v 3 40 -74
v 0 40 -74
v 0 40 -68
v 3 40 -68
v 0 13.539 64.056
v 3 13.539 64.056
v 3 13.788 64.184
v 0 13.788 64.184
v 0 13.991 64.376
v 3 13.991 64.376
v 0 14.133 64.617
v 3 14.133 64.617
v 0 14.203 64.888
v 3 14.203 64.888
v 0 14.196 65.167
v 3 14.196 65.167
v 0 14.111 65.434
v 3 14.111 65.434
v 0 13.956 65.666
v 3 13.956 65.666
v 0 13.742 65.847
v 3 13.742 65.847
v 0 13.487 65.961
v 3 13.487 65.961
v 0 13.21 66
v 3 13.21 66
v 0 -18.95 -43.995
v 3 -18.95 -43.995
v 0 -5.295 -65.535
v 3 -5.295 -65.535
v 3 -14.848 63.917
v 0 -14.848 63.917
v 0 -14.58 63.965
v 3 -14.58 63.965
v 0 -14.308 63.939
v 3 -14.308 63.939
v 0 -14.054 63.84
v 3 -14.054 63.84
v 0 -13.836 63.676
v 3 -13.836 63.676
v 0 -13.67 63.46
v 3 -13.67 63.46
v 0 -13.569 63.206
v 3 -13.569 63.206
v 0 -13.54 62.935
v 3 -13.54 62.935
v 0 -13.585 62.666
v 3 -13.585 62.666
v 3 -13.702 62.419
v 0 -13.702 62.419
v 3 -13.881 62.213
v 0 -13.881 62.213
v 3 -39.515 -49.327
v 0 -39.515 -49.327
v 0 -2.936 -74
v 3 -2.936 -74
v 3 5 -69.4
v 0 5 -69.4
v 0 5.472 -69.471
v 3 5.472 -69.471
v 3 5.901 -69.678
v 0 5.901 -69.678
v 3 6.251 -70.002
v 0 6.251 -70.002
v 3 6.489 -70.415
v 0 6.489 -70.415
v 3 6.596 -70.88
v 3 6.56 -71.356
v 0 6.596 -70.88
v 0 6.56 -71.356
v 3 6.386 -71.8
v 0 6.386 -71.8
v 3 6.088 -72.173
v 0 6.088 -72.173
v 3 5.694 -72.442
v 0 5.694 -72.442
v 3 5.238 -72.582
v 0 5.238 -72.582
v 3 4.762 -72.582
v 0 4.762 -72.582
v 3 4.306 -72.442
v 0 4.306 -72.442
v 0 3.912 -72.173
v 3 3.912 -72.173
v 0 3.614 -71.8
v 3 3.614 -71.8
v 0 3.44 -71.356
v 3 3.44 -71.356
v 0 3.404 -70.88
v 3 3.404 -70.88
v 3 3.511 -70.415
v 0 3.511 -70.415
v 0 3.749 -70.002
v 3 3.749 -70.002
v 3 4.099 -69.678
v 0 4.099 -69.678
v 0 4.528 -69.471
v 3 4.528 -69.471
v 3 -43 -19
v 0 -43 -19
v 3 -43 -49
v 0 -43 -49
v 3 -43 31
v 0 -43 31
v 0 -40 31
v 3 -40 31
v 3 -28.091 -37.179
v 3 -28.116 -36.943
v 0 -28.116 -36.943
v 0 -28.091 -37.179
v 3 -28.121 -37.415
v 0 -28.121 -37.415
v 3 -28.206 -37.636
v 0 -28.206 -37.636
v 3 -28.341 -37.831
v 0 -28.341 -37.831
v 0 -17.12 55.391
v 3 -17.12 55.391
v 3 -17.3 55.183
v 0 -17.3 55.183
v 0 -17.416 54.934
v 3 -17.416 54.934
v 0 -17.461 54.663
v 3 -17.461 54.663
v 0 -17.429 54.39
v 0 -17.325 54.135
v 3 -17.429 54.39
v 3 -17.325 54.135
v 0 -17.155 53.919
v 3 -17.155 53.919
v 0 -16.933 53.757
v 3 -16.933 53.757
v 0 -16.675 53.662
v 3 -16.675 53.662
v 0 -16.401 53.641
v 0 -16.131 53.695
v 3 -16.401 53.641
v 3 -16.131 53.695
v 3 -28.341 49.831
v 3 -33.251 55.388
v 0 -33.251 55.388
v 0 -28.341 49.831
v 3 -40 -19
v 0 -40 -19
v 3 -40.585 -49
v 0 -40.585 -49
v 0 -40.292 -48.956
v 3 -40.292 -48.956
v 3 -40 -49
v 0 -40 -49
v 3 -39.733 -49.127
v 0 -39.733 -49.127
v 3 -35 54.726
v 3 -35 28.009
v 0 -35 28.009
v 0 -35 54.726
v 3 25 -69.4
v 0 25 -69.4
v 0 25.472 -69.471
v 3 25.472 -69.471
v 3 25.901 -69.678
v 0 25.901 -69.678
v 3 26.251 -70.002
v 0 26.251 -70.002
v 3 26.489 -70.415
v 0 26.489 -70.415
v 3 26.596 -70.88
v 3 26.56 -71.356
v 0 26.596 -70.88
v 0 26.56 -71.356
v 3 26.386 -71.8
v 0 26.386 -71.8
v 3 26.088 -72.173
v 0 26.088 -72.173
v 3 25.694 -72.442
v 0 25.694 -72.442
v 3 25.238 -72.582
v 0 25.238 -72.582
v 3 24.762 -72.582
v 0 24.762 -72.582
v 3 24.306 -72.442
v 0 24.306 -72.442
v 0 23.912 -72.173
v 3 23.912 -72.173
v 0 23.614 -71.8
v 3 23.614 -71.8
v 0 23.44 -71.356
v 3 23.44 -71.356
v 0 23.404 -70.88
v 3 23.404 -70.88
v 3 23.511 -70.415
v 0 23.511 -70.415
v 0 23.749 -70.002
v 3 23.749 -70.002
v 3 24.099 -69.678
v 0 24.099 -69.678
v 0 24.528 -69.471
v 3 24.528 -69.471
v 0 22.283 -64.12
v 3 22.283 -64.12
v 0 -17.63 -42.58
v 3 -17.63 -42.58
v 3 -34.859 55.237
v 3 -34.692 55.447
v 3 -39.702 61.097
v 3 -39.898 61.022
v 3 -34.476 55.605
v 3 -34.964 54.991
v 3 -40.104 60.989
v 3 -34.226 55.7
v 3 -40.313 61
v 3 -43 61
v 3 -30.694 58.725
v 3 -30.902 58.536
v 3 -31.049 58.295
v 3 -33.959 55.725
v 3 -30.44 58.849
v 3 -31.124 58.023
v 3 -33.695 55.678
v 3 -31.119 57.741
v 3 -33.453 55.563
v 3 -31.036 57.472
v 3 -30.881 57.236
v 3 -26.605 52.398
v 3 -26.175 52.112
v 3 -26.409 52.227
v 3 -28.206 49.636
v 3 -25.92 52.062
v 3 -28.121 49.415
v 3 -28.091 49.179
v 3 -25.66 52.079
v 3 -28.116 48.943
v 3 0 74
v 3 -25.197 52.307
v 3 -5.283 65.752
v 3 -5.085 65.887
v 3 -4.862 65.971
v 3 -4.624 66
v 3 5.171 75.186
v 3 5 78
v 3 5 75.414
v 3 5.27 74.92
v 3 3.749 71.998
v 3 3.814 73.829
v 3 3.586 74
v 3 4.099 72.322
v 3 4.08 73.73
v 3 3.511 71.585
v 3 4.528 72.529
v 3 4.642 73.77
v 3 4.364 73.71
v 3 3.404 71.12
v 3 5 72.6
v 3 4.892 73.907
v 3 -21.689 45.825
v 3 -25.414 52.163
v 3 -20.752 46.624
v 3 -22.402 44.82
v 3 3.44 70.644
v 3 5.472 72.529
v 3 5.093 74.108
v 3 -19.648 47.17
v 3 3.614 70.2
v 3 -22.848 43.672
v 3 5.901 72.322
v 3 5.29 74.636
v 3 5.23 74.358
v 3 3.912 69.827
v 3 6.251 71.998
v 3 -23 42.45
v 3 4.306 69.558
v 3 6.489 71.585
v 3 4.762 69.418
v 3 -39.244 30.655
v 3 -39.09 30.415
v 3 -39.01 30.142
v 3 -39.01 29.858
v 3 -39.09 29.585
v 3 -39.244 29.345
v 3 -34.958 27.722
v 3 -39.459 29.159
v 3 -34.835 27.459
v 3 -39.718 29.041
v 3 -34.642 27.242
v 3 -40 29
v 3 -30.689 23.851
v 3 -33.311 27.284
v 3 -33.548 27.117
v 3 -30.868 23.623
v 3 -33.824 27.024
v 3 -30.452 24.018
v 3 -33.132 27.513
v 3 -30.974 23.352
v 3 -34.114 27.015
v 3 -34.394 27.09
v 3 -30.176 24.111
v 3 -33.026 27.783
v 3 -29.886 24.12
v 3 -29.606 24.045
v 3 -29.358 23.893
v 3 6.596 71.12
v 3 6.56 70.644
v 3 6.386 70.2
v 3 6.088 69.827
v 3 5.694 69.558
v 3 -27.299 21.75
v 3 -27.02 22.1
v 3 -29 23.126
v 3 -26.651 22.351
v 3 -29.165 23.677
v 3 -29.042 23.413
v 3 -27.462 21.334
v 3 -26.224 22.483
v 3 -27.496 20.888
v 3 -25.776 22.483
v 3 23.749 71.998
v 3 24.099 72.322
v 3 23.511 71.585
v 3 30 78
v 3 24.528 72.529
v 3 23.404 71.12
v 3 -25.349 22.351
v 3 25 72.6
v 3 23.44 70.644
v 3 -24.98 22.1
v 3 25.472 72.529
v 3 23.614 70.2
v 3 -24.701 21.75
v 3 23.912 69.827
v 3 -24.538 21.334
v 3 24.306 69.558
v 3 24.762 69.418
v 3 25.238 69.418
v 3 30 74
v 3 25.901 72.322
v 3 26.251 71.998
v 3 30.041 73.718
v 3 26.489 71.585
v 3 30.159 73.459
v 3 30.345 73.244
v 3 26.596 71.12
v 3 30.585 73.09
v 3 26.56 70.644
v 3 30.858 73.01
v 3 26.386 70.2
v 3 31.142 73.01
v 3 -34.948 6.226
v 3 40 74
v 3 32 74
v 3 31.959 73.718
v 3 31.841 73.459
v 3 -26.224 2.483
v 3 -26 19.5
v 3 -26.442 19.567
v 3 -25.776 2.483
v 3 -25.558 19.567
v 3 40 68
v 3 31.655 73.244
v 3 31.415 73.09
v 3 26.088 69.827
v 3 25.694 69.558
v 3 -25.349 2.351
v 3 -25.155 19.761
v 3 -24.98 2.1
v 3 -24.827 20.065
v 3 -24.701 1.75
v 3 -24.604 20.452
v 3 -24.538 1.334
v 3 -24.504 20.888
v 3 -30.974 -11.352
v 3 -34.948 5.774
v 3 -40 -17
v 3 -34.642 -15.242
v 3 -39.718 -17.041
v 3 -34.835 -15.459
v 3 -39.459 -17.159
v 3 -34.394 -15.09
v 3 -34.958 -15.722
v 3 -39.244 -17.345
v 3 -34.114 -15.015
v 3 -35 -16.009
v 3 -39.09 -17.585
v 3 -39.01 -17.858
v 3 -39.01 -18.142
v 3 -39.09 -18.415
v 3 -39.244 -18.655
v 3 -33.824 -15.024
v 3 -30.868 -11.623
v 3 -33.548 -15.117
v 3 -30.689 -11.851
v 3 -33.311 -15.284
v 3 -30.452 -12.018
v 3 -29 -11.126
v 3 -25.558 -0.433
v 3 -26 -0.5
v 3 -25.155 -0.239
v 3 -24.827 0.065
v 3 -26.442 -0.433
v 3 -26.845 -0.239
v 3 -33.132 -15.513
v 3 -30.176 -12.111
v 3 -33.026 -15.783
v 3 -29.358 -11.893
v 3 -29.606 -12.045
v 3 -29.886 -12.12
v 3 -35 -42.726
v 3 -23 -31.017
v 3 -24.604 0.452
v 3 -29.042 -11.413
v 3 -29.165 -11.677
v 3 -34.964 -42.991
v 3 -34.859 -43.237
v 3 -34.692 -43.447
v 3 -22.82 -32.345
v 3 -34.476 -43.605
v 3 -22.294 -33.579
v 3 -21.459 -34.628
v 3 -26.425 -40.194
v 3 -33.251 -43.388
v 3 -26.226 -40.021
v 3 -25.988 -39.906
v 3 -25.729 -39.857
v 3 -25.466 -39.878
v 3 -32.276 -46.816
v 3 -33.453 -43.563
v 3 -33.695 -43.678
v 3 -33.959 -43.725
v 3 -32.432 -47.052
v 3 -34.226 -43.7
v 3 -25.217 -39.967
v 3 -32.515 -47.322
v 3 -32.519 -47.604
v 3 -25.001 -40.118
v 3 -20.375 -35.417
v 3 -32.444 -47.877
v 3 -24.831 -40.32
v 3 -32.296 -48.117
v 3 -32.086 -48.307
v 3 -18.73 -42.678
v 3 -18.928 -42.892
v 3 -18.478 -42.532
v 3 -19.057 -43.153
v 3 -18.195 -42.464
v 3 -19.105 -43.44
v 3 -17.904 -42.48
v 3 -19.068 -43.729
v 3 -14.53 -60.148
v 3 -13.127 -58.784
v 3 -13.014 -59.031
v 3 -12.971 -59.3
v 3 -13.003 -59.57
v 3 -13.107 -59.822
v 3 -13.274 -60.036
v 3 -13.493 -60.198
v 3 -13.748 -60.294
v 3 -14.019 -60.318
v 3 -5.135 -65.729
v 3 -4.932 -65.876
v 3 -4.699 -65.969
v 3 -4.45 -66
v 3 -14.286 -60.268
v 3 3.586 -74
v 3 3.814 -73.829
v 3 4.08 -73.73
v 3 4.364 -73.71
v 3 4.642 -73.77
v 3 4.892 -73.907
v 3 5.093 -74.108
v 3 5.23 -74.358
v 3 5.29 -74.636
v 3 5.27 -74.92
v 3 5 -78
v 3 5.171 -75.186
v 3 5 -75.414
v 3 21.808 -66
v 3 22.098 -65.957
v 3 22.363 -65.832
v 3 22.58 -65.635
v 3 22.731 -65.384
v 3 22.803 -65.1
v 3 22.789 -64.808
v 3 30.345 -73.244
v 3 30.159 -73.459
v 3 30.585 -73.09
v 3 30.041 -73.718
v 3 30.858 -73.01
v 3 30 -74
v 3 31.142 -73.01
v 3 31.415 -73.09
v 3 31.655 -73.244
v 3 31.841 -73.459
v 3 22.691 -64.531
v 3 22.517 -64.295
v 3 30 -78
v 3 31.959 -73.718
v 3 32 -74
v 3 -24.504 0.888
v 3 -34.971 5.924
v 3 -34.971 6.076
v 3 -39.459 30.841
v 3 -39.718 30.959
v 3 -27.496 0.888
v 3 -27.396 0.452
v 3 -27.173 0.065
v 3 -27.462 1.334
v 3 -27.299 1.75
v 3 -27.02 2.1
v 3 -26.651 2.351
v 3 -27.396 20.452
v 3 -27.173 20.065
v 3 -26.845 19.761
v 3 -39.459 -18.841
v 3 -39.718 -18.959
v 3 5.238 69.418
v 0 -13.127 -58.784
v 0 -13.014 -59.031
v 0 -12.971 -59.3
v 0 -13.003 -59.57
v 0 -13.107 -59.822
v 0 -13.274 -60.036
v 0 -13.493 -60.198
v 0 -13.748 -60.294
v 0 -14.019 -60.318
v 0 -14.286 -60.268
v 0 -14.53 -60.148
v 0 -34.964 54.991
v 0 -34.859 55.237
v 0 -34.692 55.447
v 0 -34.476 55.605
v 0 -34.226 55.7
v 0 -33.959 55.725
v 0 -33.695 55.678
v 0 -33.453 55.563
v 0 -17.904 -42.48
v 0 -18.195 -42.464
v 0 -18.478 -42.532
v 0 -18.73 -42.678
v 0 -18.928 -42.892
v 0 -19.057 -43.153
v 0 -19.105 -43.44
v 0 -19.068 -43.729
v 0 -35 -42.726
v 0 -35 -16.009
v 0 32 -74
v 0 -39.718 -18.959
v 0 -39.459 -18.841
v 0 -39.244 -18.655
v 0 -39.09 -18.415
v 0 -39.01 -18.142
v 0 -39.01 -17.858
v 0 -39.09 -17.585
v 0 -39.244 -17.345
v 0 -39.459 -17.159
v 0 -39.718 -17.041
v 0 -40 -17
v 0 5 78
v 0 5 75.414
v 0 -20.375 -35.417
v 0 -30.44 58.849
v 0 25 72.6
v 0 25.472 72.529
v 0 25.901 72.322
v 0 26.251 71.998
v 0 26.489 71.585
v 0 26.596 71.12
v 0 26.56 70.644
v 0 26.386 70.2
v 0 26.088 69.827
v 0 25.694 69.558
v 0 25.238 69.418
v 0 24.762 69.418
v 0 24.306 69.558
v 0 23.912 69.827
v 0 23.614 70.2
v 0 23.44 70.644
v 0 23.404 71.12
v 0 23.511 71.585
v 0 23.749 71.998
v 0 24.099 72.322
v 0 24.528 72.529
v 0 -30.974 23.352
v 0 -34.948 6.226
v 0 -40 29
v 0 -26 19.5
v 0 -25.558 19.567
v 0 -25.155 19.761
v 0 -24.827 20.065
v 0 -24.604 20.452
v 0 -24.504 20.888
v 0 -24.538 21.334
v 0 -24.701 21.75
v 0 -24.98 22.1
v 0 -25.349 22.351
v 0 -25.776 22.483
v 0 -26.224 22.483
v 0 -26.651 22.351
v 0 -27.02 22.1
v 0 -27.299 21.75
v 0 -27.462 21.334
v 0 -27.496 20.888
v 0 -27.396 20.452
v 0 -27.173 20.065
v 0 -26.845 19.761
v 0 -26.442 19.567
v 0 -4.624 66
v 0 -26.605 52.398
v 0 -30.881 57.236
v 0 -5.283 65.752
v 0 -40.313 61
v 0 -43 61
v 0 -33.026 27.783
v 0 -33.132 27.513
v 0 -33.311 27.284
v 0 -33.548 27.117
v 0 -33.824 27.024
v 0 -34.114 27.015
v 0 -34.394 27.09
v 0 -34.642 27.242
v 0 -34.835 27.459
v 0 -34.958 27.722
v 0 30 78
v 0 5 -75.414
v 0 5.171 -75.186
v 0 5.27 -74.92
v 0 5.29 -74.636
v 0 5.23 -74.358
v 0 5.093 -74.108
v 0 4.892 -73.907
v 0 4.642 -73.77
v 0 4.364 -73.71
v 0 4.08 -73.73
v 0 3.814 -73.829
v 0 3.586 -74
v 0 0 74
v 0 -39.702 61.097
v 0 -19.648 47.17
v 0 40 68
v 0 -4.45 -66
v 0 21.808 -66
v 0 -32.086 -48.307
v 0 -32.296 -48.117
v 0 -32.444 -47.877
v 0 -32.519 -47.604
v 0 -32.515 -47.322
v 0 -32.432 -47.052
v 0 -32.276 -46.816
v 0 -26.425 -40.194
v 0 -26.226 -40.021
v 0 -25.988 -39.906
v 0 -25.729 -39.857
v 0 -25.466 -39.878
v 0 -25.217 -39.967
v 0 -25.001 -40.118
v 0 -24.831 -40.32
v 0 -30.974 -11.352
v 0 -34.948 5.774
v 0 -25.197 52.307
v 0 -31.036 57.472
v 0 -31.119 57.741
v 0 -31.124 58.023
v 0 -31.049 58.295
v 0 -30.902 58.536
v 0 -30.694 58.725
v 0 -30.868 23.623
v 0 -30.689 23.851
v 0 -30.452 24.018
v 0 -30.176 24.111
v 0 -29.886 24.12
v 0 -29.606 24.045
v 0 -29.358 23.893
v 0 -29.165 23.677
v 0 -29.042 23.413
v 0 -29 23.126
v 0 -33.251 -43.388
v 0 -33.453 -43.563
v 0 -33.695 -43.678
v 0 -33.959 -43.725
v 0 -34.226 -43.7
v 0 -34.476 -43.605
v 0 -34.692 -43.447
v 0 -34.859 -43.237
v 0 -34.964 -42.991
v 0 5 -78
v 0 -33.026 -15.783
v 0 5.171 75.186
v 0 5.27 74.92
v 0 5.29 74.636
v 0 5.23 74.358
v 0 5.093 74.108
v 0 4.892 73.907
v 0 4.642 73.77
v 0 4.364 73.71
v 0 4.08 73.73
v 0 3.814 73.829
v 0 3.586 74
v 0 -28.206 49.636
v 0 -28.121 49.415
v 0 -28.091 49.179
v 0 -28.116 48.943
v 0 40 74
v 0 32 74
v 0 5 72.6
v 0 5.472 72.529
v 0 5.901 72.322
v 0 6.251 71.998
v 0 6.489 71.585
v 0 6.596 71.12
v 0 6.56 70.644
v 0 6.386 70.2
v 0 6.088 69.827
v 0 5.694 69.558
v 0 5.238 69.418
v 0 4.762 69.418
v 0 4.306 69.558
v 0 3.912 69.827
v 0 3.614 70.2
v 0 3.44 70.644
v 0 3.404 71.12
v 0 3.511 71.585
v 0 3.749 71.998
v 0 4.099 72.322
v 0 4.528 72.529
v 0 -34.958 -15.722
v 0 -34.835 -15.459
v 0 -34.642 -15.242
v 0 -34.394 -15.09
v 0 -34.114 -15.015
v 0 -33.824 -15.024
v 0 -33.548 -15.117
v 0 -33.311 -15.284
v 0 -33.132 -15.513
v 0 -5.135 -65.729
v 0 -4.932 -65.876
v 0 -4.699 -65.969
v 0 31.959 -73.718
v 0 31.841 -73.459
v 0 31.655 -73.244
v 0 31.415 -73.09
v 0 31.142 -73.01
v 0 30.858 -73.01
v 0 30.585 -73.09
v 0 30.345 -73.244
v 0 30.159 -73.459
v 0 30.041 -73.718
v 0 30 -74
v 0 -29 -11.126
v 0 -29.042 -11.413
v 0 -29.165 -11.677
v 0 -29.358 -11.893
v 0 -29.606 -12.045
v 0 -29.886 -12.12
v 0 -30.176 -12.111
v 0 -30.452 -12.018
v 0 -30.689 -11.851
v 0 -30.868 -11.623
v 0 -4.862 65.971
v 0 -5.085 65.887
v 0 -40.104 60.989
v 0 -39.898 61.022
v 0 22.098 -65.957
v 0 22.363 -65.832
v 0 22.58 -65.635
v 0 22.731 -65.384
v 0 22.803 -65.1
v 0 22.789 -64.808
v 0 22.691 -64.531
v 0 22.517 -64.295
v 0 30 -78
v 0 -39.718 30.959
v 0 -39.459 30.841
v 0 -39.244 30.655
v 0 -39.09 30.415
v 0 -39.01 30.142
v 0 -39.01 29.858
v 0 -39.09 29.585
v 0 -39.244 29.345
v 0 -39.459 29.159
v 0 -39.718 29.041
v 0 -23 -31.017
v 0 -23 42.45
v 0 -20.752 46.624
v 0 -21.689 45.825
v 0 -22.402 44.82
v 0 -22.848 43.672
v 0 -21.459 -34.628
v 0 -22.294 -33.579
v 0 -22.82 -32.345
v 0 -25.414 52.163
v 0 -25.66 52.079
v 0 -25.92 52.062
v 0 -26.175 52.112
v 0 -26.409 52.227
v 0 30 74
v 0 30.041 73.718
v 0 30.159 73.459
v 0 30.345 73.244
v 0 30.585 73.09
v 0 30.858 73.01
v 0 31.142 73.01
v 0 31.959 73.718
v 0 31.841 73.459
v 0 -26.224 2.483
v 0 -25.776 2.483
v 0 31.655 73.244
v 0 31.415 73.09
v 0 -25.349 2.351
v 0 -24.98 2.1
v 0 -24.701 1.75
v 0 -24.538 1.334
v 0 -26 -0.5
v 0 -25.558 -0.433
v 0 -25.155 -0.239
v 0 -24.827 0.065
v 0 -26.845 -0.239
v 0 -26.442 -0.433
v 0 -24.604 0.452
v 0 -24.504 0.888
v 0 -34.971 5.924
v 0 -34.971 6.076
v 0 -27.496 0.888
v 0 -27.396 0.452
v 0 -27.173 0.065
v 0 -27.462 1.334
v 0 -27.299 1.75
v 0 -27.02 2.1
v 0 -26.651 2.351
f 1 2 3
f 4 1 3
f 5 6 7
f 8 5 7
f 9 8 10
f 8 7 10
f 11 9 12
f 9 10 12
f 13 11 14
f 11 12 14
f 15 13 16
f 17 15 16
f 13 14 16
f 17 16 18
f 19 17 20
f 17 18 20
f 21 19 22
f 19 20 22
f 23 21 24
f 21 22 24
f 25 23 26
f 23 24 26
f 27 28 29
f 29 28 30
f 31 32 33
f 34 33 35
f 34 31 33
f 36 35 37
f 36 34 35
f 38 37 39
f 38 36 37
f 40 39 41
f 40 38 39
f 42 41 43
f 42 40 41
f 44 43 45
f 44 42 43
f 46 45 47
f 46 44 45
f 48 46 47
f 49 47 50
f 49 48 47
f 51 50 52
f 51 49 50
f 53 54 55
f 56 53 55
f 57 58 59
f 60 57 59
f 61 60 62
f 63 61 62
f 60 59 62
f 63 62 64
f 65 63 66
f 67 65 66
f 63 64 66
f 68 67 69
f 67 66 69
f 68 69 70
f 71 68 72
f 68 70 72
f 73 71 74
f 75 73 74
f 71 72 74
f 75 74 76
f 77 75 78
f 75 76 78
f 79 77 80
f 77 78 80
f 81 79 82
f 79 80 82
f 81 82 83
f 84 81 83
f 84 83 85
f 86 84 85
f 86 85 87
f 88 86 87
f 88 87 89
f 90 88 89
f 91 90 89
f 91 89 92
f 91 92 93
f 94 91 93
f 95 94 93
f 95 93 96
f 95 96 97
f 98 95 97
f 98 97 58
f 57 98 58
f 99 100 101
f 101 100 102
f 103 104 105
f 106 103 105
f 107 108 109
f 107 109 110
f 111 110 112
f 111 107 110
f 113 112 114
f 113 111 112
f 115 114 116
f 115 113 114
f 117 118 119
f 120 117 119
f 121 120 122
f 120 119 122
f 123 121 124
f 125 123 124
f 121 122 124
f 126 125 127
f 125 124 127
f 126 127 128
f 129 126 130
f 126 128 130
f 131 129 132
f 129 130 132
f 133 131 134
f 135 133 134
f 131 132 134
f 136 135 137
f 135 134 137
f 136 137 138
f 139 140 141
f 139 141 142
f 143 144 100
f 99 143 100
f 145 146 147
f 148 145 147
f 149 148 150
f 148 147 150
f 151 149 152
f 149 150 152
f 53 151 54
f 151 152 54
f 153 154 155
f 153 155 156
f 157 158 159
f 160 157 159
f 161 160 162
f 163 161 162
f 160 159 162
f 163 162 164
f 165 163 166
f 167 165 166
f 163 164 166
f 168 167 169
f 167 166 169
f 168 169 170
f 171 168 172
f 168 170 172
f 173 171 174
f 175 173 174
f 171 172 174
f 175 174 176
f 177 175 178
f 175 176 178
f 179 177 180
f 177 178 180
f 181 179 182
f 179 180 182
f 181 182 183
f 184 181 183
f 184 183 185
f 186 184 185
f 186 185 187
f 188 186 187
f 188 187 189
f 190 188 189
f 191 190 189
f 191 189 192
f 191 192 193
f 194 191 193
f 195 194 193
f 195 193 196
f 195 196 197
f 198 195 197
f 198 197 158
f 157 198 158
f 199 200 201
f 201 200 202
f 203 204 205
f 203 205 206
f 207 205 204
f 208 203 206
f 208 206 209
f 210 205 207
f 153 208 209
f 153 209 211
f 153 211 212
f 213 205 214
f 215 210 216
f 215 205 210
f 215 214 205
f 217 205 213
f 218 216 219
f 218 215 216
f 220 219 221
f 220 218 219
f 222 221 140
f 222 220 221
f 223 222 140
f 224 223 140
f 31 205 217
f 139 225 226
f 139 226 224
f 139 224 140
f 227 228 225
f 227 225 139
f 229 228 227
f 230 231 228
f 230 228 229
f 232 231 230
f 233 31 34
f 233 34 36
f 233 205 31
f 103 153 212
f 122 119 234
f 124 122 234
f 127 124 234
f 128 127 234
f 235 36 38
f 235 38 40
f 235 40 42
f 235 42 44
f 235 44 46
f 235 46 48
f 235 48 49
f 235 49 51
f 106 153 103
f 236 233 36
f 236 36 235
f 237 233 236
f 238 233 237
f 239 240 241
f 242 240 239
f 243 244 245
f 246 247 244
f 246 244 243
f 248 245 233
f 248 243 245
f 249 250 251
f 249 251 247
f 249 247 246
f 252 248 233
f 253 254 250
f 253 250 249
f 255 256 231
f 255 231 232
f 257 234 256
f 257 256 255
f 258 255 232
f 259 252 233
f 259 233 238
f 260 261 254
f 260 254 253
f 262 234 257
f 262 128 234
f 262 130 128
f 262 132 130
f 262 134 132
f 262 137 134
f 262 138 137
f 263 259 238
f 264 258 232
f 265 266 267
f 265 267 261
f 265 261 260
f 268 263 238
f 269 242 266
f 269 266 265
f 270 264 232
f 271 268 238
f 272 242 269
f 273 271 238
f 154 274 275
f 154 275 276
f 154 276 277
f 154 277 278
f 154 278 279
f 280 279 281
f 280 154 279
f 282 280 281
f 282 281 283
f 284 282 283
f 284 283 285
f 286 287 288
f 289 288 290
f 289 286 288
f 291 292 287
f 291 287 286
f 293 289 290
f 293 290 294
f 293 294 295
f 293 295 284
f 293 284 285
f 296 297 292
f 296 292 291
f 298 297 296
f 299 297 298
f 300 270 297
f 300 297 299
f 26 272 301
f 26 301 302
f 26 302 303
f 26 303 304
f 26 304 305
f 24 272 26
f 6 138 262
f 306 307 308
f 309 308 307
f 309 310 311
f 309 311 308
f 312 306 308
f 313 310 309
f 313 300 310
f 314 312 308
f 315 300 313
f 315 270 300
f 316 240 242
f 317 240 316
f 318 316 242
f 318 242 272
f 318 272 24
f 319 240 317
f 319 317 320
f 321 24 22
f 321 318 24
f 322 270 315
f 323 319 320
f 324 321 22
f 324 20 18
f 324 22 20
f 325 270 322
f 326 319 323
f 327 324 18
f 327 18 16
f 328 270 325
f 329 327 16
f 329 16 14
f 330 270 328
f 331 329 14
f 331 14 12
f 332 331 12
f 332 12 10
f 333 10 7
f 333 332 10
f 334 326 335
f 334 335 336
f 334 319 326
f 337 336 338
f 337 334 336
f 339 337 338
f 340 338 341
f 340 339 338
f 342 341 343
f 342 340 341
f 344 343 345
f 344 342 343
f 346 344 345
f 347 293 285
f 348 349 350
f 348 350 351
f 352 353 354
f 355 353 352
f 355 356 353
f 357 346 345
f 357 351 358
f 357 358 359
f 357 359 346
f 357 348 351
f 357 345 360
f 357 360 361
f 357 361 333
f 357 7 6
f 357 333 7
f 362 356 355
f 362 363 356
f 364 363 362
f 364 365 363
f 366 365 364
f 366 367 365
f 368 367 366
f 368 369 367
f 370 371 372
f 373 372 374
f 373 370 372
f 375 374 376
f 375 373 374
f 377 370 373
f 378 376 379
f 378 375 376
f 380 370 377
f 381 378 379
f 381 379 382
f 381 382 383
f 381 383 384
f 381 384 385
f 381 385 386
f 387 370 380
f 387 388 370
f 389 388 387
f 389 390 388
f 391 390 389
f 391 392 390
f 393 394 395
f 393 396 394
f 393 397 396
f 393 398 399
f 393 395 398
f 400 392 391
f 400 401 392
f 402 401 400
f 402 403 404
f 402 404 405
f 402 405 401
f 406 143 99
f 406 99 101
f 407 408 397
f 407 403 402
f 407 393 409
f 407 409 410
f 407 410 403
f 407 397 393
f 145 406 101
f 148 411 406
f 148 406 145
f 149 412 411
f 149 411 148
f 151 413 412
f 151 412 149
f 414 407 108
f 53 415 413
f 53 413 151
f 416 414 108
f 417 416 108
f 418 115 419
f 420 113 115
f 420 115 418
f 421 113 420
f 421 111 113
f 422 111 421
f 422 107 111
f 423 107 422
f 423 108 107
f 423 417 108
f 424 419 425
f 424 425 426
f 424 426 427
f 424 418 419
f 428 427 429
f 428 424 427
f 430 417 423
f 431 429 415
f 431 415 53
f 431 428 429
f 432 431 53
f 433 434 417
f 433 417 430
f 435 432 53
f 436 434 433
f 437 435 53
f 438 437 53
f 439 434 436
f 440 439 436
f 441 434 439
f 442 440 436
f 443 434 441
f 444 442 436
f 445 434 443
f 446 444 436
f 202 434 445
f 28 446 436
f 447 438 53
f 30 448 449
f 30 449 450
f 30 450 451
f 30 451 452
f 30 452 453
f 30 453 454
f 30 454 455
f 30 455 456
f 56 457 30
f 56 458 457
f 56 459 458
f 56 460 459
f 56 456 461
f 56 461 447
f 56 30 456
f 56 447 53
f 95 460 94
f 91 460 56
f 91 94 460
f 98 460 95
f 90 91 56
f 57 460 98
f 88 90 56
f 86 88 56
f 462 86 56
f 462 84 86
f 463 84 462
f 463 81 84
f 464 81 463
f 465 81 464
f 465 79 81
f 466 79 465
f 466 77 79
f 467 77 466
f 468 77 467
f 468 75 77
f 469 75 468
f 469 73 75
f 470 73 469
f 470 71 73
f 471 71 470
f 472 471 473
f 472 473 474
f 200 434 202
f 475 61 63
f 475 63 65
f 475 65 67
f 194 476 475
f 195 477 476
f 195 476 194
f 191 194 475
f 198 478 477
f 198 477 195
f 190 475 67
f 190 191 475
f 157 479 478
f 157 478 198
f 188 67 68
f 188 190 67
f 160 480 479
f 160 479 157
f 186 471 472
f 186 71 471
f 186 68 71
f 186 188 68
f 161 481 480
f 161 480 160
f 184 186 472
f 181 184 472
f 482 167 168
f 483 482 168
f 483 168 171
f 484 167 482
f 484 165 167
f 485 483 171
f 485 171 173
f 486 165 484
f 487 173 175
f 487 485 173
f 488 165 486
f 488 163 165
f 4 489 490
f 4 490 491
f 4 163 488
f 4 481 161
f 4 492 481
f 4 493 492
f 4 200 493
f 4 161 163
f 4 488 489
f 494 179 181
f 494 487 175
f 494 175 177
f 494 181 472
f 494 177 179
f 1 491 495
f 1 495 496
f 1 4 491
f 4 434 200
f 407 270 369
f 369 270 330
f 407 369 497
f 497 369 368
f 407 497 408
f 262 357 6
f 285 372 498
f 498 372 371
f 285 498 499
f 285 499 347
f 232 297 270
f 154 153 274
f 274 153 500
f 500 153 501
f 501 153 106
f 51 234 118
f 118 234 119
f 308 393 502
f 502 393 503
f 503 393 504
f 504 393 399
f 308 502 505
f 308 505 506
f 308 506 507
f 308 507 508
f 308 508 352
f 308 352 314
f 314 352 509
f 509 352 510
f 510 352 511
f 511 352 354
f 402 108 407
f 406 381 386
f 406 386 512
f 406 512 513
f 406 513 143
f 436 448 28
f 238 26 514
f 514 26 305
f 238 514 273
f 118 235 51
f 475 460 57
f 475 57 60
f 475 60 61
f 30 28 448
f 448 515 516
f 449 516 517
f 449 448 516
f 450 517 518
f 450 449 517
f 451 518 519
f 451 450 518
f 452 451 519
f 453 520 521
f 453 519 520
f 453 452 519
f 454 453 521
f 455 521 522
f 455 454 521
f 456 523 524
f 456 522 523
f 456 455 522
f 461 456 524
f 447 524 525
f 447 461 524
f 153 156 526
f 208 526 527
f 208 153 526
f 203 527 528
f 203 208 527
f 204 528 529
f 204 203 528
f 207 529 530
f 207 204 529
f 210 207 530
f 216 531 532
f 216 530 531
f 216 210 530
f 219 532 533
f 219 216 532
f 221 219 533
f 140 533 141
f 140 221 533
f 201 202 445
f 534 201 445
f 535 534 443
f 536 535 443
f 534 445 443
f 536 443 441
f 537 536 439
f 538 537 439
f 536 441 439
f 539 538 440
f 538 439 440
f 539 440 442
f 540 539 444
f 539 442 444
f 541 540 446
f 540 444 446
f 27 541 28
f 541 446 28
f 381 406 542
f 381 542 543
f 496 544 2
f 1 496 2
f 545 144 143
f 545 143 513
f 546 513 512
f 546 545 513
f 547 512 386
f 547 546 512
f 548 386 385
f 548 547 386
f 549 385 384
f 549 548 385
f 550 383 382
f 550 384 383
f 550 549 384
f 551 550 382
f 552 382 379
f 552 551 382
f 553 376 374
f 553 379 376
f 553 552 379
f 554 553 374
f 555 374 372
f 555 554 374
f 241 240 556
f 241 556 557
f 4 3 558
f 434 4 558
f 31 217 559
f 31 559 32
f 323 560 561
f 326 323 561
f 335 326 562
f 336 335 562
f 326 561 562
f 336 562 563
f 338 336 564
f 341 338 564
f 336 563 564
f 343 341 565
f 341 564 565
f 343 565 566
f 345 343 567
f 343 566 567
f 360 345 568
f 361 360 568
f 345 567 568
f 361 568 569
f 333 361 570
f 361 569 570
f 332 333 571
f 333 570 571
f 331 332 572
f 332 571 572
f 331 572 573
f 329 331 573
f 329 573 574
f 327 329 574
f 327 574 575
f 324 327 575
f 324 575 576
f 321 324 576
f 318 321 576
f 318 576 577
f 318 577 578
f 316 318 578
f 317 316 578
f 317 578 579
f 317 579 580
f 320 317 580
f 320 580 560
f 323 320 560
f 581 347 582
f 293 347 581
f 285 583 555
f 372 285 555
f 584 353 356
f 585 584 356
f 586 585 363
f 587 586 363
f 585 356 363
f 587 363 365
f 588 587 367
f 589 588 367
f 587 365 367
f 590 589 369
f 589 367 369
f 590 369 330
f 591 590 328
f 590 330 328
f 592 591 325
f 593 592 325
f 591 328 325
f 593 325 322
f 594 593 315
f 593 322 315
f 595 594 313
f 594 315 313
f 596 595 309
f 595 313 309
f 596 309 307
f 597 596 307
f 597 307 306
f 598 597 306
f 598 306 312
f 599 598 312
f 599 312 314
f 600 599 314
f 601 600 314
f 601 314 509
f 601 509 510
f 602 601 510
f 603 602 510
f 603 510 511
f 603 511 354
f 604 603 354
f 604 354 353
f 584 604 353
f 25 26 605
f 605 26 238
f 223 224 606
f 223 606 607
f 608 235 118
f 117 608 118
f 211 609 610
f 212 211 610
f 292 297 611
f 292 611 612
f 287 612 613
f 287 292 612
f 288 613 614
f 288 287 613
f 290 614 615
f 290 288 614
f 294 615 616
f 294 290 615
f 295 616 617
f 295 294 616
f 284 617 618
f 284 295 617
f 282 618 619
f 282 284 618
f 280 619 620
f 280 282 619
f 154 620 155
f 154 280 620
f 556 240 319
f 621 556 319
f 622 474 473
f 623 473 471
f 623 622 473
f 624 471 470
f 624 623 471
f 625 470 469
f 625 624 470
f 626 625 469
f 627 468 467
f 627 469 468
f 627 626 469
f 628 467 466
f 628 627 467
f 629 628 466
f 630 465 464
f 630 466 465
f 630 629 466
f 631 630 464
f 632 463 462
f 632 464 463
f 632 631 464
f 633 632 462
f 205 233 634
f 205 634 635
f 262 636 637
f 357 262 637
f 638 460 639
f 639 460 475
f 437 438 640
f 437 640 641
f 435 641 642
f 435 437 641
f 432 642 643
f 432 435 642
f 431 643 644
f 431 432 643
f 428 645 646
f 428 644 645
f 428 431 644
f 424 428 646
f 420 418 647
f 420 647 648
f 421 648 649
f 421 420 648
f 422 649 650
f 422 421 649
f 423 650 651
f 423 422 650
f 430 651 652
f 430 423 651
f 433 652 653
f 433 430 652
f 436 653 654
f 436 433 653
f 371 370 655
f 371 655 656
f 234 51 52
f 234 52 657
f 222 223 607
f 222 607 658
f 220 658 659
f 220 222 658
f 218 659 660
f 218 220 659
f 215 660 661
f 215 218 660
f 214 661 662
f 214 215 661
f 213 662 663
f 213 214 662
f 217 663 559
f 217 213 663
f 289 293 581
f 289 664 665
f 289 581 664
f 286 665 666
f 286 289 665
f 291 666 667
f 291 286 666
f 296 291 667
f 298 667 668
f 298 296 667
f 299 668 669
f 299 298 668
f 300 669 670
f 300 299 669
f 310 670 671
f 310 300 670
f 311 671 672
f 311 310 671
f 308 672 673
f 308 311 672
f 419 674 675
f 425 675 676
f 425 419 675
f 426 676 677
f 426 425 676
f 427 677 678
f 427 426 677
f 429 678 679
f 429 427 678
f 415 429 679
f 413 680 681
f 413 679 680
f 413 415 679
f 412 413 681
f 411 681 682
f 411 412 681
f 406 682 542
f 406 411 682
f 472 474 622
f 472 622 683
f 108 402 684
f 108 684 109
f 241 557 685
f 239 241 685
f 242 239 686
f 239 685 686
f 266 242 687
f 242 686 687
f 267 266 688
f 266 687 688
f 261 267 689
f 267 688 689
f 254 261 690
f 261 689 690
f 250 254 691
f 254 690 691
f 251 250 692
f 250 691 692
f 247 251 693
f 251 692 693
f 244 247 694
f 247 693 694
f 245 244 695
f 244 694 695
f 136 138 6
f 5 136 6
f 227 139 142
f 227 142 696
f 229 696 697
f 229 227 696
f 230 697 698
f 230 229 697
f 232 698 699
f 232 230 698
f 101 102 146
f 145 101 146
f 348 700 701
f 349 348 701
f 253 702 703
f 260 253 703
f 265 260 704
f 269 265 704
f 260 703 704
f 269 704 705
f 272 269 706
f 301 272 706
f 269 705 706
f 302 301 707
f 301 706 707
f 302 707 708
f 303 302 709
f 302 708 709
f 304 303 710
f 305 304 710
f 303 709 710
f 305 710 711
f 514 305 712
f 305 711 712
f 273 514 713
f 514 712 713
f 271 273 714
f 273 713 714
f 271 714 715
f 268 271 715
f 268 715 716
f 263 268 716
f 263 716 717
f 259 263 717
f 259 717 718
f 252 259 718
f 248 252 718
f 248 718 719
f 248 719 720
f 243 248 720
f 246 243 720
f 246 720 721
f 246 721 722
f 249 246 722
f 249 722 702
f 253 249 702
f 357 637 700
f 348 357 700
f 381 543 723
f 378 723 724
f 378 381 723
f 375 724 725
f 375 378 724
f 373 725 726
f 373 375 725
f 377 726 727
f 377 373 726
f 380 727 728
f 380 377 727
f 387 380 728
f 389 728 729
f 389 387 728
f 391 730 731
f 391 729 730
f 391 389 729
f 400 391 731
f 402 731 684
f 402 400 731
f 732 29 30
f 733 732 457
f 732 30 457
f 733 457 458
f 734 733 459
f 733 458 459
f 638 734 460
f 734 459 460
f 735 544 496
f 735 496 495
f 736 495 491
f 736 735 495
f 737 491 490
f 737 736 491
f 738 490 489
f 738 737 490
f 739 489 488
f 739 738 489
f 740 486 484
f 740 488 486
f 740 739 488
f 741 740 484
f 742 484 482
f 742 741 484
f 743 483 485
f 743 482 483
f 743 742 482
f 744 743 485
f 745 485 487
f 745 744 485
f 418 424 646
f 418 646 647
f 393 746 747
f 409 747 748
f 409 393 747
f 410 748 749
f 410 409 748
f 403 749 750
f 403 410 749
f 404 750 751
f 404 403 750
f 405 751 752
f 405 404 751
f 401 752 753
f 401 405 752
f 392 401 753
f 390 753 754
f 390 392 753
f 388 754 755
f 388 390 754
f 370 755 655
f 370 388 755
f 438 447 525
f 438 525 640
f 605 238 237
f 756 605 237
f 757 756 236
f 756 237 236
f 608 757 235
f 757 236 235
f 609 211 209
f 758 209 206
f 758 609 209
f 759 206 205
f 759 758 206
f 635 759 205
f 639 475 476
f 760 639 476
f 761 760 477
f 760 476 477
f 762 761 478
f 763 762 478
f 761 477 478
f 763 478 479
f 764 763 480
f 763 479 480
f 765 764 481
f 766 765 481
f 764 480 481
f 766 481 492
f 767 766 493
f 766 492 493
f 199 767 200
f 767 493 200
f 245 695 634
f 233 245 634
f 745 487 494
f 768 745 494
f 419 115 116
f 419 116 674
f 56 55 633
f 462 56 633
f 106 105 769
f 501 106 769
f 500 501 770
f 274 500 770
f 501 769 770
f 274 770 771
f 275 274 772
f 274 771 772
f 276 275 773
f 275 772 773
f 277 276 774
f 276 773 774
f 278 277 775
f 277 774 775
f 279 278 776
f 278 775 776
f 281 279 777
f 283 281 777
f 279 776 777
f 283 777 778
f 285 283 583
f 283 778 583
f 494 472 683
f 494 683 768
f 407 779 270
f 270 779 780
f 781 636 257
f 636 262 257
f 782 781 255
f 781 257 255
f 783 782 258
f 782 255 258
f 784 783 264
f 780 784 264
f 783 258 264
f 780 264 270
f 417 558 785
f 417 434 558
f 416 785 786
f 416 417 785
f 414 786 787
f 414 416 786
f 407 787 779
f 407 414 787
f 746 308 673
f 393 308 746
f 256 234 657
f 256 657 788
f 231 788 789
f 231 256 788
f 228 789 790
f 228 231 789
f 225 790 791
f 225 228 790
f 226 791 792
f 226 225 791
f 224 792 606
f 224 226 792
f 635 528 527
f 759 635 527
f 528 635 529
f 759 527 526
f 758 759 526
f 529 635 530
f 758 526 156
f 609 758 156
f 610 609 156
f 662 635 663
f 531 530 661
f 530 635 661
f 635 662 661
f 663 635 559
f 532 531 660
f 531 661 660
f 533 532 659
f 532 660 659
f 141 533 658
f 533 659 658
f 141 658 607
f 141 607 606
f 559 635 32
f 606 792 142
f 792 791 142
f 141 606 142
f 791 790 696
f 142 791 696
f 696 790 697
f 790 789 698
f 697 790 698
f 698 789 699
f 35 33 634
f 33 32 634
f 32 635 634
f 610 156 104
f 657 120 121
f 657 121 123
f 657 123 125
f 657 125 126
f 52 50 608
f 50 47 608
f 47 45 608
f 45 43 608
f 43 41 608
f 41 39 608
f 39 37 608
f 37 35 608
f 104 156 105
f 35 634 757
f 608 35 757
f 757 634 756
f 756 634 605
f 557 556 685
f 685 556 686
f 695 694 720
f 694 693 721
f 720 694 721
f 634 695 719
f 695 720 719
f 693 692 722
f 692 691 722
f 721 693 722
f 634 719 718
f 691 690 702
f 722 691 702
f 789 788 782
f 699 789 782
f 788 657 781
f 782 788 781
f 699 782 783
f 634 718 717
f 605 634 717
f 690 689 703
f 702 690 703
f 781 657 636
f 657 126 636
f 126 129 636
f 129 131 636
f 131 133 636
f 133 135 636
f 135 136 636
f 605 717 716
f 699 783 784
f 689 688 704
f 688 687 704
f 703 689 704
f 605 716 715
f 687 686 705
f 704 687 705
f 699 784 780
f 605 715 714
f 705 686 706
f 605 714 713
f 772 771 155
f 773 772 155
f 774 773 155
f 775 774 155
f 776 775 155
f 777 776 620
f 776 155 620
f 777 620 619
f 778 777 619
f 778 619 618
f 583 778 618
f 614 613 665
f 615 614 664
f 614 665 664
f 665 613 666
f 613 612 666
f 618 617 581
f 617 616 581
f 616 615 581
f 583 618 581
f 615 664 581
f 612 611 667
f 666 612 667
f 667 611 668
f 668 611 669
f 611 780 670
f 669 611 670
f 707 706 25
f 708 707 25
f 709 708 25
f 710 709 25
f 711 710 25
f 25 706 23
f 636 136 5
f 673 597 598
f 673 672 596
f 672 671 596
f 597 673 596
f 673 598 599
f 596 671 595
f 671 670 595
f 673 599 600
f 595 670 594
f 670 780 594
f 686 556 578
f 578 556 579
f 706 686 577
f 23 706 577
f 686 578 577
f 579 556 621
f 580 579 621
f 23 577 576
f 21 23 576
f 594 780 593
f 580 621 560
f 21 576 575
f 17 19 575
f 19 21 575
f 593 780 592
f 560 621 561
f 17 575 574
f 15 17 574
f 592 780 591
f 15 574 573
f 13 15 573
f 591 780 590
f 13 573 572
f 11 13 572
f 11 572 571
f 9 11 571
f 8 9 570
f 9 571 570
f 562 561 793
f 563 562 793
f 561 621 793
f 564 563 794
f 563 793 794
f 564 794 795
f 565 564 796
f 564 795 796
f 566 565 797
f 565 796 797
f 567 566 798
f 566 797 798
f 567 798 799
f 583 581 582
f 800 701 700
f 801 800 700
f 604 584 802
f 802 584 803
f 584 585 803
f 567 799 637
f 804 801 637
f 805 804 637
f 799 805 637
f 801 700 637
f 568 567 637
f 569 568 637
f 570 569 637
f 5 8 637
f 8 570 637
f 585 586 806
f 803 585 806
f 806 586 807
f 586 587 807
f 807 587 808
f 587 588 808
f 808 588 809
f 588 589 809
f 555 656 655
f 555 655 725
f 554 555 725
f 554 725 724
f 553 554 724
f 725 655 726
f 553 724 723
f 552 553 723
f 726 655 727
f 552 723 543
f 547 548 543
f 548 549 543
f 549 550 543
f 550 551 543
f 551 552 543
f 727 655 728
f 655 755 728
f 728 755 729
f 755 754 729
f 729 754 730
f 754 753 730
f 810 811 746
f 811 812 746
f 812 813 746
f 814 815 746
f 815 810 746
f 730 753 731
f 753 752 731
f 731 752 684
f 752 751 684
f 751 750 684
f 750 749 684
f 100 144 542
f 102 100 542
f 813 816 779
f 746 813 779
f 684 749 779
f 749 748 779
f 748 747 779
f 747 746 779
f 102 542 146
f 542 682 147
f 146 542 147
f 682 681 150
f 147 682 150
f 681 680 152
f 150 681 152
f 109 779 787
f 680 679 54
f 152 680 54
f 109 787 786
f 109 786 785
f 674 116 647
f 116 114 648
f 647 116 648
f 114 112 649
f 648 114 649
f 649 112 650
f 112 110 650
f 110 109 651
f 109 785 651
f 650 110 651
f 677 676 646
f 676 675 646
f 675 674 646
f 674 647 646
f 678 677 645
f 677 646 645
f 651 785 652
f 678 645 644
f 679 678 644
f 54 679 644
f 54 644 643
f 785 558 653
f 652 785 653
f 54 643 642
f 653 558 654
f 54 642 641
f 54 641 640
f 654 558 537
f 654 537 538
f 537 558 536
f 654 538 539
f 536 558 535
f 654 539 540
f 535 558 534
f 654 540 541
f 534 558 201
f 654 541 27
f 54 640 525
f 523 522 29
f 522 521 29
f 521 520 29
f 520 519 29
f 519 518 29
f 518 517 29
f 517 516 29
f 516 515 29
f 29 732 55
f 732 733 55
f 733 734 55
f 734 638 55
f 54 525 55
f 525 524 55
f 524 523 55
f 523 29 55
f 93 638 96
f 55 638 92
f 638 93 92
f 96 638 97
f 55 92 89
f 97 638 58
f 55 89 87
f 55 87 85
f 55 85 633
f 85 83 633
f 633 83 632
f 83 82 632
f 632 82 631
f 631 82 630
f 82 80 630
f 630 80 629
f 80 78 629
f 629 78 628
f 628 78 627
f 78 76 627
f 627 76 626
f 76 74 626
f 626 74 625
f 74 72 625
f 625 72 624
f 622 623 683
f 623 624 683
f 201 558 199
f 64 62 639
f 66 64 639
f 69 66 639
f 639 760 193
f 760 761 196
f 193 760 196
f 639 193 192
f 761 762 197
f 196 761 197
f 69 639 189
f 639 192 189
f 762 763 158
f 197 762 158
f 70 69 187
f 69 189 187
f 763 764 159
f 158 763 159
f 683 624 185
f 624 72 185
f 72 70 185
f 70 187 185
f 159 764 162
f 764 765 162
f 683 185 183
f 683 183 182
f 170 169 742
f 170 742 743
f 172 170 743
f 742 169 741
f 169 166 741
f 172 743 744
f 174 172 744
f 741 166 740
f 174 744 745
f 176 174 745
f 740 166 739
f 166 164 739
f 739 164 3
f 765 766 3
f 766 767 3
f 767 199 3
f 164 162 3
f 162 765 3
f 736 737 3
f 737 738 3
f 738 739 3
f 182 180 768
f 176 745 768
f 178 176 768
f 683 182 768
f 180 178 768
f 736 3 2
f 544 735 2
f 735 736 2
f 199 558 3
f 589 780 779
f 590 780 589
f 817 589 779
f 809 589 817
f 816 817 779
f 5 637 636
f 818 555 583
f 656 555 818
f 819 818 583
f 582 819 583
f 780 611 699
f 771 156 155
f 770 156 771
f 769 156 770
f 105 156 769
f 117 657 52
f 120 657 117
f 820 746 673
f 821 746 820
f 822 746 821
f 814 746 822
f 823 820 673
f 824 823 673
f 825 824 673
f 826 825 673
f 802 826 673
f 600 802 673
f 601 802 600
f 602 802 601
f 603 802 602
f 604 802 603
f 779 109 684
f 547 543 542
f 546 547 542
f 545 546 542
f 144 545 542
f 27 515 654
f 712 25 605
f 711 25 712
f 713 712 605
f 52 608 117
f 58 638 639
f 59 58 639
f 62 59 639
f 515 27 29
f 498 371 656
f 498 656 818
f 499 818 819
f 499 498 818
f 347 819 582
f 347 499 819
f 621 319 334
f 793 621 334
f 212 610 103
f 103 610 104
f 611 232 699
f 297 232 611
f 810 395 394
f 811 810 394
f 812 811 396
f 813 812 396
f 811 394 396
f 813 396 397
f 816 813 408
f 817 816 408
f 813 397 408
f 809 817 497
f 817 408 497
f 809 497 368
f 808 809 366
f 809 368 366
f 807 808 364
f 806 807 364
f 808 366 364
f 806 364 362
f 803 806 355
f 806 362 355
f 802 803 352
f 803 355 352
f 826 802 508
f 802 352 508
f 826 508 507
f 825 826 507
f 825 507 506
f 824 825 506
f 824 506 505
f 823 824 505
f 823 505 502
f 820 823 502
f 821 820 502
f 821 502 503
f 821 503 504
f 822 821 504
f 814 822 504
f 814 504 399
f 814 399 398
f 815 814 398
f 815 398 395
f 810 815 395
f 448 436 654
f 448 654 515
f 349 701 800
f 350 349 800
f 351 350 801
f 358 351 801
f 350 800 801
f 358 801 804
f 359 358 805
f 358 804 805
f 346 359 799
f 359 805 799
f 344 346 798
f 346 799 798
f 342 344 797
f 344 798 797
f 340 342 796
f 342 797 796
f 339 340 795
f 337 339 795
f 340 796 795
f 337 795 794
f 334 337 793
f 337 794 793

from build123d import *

# Parameters (mm, degrees)
EXTRUDE_1_DEPTH     = 3
SKETCH_2_W          = 4
SKETCH_2_H          = 25
EXTRUDE_2_DEPTH     = 3
SKETCH_6_R          = 1.6
CUT_EXTRUDE_4_DEPTH = 4
CUT_EXTRUDE_5_DEPTH = 10
CUT_EXTRUDE_7_DEPTH = 10
FILLET_1_R          = 5
SKETCH_11_R         = 1.5
CUT_EXTRUDE_8_DEPTH = 90.117899437


with BuildPart() as part:
    # 草图1 → 凸台-拉伸1 (new body)
    with BuildSketch(Plane(origin=(0, 0, 0), x_dir=(0, 0, -1), z_dir=(1, 0, 0))):
        Polygon((-46, -23), (-68, 40), (-74, 40), (-74, -20.726707409), (-61, -40), (-61, -43), (-31, -43), (-31, -40), (19, -40), (19, -43), (49, -43), (49, -40), (74, -2.935975787), (74, 40), (68, 40), (34, -23), align=None)
    extrude(amount=EXTRUDE_1_DEPTH)

    # 草图2 → 凸台-拉伸2 (add)
    with BuildSketch(Plane(origin=(3, 0, 0), x_dir=(0, 0, -1), z_dir=(1, 0, 0))):
        with Locations((-76, 17.5)):
            Rectangle(SKETCH_2_W, SKETCH_2_H)
        with Locations((76, 17.5)):
            Rectangle(SKETCH_2_W, SKETCH_2_H)
    extrude(amount=-EXTRUDE_2_DEPTH)

    # 草图6 → 切除-拉伸4 (cut)
    with BuildSketch(Plane.ZY):
        with Locations((-71, 5)):
            Circle(SKETCH_6_R)
        with Locations((71, 25)):
            Circle(SKETCH_6_R)
        with Locations((71, 5)):
            Circle(SKETCH_6_R)
        with Locations((-71, 25)):
            Circle(SKETCH_6_R)
    extrude(amount=-CUT_EXTRUDE_4_DEPTH, mode=Mode.SUBTRACT)

    # 草图7 → 切除-拉伸5 (cut)
    with BuildSketch(Plane(origin=(3, 0, 0), x_dir=(0, 0, -1), z_dir=(1, 0, 0))):
        with BuildLine():
            Line((-66, 13.209781141), (-66, -4.624153975))
            ThreePointArc((-66, -4.624153975), (-65.936068557, -4.975971621), (-65.752448687, -5.282804848))
            Line((-65.752448687, -5.282804848), (-55.391275304, -17.119502604))
            ThreePointArc((-55.391275304, -17.119502604), (-54.135455337, -17.324921956), (-53.694734868, -16.131168898))
            Line((-53.694734868, -16.131168898), (-64.055908251, 13.539463974))
            ThreePointArc((-64.055908251, 13.539463974), (-65.167194873, 14.195705009), (-66, 13.209781141))
        make_face()
        with BuildLine():
            Line((66, -4.449930151), (66, 21.807804944))
            ThreePointArc((66, 21.807804944), (65.244926343, 22.777346633), (64.119977827, 22.282737545))
            Line((64.119977827, 22.282737545), (42.579599238, -17.630316899))
            ThreePointArc((42.579599238, -17.630316899), (42.777733508, -18.836706189), (43.995039468, -18.94983668))
            Line((43.995039468, -18.94983668), (65.535418057, -5.29451733))
            ThreePointArc((65.535418057, -5.29451733), (65.876190064, -4.931895887), (66, -4.449930151))
        make_face()
        Polygon((-74, 0), (-61, -40), (-74, -20.726707409), align=None)
        with BuildLine():
            Line((-62.213350607, -13.880667443), (-52.307335811, -25.197387929))
            ThreePointArc((-52.307335811, -25.197387929), (-52.061835208, -25.920048281), (-52.39764858, -26.605422566))
            Line((-52.39764858, -26.605422566), (-57.236264859, -30.880697516))
            ThreePointArc((-57.236264859, -30.880697516), (-58.161708676, -31.096025601), (-58.849434846, -30.440399824))
            Line((-58.849434846, -30.440399824), (-63.916833363, -14.848404388))
            ThreePointArc((-63.916833363, -14.848404388), (-63.459750443, -13.669828659), (-62.213350607, -13.880667443))
        make_face()
        with BuildLine():
            Line((-55.387669494, -33.250616236), (-49.831358953, -28.341205383))
            ThreePointArc((-49.831358953, -28.341205383), (-49.414538234, -28.121145774), (-48.943216882, -28.116463272))
            Line((-48.943216882, -28.116463272), (-27.782801194, -33.025874126))
            ThreePointArc((-27.782801194, -33.025874126), (-27.015296935, -34.11374121), (-28.008807346, -35))
            Line((-28.008807346, -35), (-54.725533576, -35))
            ThreePointArc((-54.725533576, -35), (-55.660783212, -34.353988867), (-55.387669494, -33.250616236))
        make_face()
        with BuildLine():
            Line((-23.126212383, -29), (11.126212383, -29))
            ThreePointArc((11.126212383, -29), (12.119722794, -29.88625879), (11.352218536, -30.974125874))
            Line((11.352218536, -30.974125874), (-5.773993847, -34.947564496))
            ThreePointArc((-5.773993847, -34.947564496), (-6, -34.973438622), (-6.226006153, -34.947564496))
            Line((-6.226006153, -34.947564496), (-23.352218536, -30.974125874))
            ThreePointArc((-23.352218536, -30.974125874), (-24.119722794, -29.88625879), (-23.126212383, -29))
        make_face()
        with BuildLine():
            Line((15.782801194, -33.025874126), (36.943216882, -28.116463272))
            ThreePointArc((36.943216882, -28.116463272), (37.414538234, -28.121145774), (37.831358953, -28.341205383))
            Line((37.831358953, -28.341205383), (43.387669494, -33.250616236))
            ThreePointArc((43.387669494, -33.250616236), (43.660783212, -34.353988867), (42.725533576, -35))
            Line((42.725533576, -35), (16.008807346, -35))
            ThreePointArc((16.008807346, -35), (15.015296935, -34.11374121), (15.782801194, -33.025874126))
        make_face()
        with BuildLine():
            Line((40.32049134, -24.831312908), (58.783941471, -13.126583263))
            ThreePointArc((58.783941471, -13.126583263), (60.036438838, -13.274178861), (60.148397101, -14.530363346))
            Line((60.148397101, -14.530363346), (48.30691143, -32.086087811))
            ThreePointArc((48.30691143, -32.086087811), (47.604393348, -32.518859029), (46.815737939, -32.276278671))
            Line((46.815737939, -32.276278671), (40.193773479, -26.425283852))
            ThreePointArc((40.193773479, -26.425283852), (39.859054482, -25.596651891), (40.32049134, -24.831312908))
        make_face()
    extrude(amount=-CUT_EXTRUDE_5_DEPTH, mode=Mode.SUBTRACT)

    # 草图10 → 切除-拉伸7 (cut)
    with BuildSketch(Plane.ZY):
        with BuildLine():
            Line((61.096725602, -39.702382762), (61, -40.312940669))
            ThreePointArc((61, -40.312940669), (61, -40), (61.096725602, -39.702382762))
        make_face()
        with BuildLine():
            Line((-74, 30), (-74, 32))
            ThreePointArc((-74, 32), (-73, 31), (-74, 30))
        make_face()
        with BuildLine():
            Line((74, 30), (74, 32))
            ThreePointArc((74, 32), (73, 31), (74, 30))
        make_face()
        with BuildLine():
            Line((-74, 3.585786438), (-75.414213562, 5))
            ThreePointArc((-75.414213562, 5), (-74, 5), (-74, 3.585786438))
        make_face()
        with BuildLine():
            Line((74, 3.585786438), (75.414213562, 5))
            ThreePointArc((75.414213562, 5), (74, 5), (74, 3.585786438))
        make_face()
        with BuildLine():
            Line((-17, -40), (-19, -40))
            ThreePointArc((-19, -40), (-18, -39), (-17, -40))
        make_face()
        with BuildLine():
            Line((29, -40), (31, -40))
            ThreePointArc((31, -40), (30, -39), (29, -40))
        make_face()
        with BuildLine():
            Line((-49.326984365, -39.515225743), (-49, -40.584743409))
            ThreePointArc((-49, -40.584743409), (-49, -40), (-49.326984365, -39.515225743))
        make_face()
    extrude(amount=-CUT_EXTRUDE_7_DEPTH, mode=Mode.SUBTRACT)

    # 圆角1
    fillet_1_edges = [part.edges().sort_by_distance(p)[0] for p in [
        (1.5, -23, 46),
        (1.5, -23, -34),
    ]]
    fillet(fillet_1_edges, radius=FILLET_1_R)

    # 草图11 → 切除-拉伸8 (cut, through all)
    with BuildSketch(Plane(origin=(3, 0, 0), x_dir=(0, 0, -1), z_dir=(1, 0, 0))):
        with Locations((-1, -26)):
            Circle(SKETCH_11_R)
        with Locations((-21, -26)):
            Circle(SKETCH_11_R)
    extrude(amount=-CUT_EXTRUDE_8_DEPTH, mode=Mode.SUBTRACT)


solid = part.part
